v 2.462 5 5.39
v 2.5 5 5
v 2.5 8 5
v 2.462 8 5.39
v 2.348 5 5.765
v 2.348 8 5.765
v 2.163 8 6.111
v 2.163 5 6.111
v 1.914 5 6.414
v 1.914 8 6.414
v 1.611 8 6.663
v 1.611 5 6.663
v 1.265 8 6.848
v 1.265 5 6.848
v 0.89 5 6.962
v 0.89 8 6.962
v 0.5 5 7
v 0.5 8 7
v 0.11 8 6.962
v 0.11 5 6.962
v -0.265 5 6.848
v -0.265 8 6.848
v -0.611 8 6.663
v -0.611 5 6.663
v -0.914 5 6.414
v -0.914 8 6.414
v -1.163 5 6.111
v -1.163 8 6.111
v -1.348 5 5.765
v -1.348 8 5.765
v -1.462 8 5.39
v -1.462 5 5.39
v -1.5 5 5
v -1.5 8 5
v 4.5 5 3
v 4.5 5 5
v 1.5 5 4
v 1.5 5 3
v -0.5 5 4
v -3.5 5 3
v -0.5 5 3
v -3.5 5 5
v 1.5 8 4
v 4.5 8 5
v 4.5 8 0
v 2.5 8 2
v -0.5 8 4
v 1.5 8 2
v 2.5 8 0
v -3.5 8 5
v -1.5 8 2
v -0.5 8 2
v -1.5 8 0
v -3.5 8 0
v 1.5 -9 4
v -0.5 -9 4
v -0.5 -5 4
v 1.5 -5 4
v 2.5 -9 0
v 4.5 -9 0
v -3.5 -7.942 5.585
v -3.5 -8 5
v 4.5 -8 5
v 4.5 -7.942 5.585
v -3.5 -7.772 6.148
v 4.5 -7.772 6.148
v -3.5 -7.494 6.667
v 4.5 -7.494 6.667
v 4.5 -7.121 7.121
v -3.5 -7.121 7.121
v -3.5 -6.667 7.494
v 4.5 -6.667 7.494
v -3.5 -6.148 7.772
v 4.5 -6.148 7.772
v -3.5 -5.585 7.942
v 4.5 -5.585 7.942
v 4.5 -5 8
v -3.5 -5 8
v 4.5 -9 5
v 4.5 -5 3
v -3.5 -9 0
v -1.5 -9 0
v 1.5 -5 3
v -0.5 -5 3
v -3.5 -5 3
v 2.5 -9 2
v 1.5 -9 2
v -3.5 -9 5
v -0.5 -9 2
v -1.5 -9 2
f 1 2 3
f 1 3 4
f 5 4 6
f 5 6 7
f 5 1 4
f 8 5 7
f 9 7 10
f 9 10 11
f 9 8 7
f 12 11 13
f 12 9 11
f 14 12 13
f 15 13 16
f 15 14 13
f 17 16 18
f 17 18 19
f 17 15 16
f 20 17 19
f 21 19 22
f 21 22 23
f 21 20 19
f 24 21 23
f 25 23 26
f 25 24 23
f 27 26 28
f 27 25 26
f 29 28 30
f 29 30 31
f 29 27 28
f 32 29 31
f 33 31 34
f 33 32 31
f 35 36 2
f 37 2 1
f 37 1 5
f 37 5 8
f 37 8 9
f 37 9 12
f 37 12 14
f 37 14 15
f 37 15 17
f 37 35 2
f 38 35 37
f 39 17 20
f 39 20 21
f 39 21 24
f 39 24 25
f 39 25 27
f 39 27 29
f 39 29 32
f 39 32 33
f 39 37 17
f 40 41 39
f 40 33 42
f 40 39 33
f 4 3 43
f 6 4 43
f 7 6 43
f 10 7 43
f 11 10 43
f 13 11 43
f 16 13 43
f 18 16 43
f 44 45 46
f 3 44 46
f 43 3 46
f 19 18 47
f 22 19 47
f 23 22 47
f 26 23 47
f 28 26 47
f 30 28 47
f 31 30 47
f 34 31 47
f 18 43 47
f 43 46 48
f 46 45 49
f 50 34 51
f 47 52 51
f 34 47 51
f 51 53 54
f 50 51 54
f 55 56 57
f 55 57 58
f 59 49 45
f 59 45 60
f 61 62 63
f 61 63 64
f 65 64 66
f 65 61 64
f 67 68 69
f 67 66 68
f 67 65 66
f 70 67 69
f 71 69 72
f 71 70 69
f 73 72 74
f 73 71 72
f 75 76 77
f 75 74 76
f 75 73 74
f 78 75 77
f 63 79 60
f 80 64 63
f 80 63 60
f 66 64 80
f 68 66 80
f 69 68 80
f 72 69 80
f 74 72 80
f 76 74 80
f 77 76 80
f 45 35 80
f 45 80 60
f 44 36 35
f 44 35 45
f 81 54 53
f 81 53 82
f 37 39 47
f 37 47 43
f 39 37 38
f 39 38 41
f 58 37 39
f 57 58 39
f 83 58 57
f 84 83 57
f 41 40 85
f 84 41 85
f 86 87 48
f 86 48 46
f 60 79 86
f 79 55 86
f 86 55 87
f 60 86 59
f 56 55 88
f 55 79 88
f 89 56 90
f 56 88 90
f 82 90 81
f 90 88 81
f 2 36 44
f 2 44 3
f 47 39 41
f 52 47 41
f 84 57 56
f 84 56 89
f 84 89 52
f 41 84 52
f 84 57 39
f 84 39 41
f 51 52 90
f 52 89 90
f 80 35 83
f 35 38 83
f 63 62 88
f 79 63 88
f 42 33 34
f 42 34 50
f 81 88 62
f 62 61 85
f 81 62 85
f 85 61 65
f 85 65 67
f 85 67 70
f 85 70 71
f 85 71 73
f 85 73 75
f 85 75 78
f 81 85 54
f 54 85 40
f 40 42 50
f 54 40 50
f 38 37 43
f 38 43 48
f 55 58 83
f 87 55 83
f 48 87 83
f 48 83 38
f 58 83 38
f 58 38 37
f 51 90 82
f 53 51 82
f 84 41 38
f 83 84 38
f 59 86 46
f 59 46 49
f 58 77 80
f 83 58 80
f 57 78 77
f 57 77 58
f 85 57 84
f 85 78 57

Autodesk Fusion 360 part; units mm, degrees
sketch "Sketch1" plane through (0, 0, 0) normal (0, 0, 1) x (1, 0, 0)
  line L0 (3.5, -5) -> (-3.5, -5)
  line L1 (-3.5, -5) -> (-3.5, 5)
  line L2 (-3.5, 5) -> (3.5, 5)
  line L3 (3.5, 5) -> (3.5, -5)
  dimension "d1" = 7
  dimension "d2" = 10
extrude "Extrude1" add sketch "Sketch1" along normal blind 3 makes body 1
sketch "Sketch2" plane through (0, 0, 3) normal (0, 0, 1) x (-1, 0, 0)
  line L0 (-3.5, -5) -> (3.5, -5)
  line L1 (3.5, -5) -> (3.5, 5)
  line L2 (3.5, 5) -> (-3.5, 5)
  line L3 (-3.5, 5) -> (-3.5, -5)
  line L4 (3.5, 5) -> (-3.5, 5)
  line L5 (-3.5, 5) -> (-3.5, 9)
  line L6 (-3.5, 9) -> (3.5, 9)
  line L7 (3.5, 9) -> (3.5, 5)
  dimension "d5" = 7
  dimension "d6" = 4
extrude "Extrude2" add sketch "Sketch2" along normal blind 2 and the other way blind 3 contours L2 L4 L5 L6 L7 bodies 1
sketch "Sketch4" plane through (3.5, 0, 0) normal (1, 0, 0) x (0, 1, 0)
  line L0 (-9, 0) -> (5, 0)
  line L1 (5, 0) -> (5, 3)
  line L2 (5, 3) -> (-5, 3)
  line L3 (-5, 3) -> (-5, 5)
  line L4 (-5, 5) -> (-9, 5)
  line L5 (-9, 5) -> (-9, 0)
  line L6 (-5, 5) -> (-5, 8)
  arc A0 (-9, 0.8769) -> (-4.2583, 3) centre (-8, 5) ccw
  arc A1 (-5, 8) -> (-8, 5) centre (-5, 5) ccw
  arc A2 (-5, 2) -> (-2.7639, 3) centre (-5, 5) ccw
  dimension "d11" = 3
  dimension "d12" = 6
extrude "Extrude3" add sketch "Sketch4" against normal blind 7 contours L4 L6 A1 bodies 1
extrude "Extrude4" add 1 faces at (3.5, -3, 1) along direction (1, 0, 0) blind 1 on bodies 1 bodies 1
sketch "Sketch6" plane through (0, -9, 0) normal (0, -1, 0) x (1, 0, 0)
  line L0 (4.5, 5) -> (-3.5, 5)
  line L1 (-3.5, 5) -> (-3.5, 0)
  line L2 (-3.5, 0) -> (4.5, 0)
  line L3 (4.5, 0) -> (4.5, 5)
  line L4 (0.5, 5) -> (0.5, 4) construction
  line L5 (-3.5, 4) -> (-0.5, 4) construction
  line L6 (-0.5, 4) -> (1.5, 4)
  line L7 (1.5, 4) -> (1.5, 2)
  line L8 (-0.5, 4) -> (-0.5, 2)
  line L9 (-0.5, 2) -> (-1.5, 2)
  line L10 (-1.5, 2) -> (-1.5, 0)
  line L11 (1.5, 2) -> (2.5, 2)
  line L12 (2.5, 2) -> (2.5, 0)
extrude "Extrude5" cut sketch "Sketch6" against normal blind 4 contours L2 L6 L7 L8 L9 L10 L11 L12 bodies 1
sketch "Sketch7" plane through (0, 0, 3) normal (0, 0, 1) x (-1, 0, 0)
  line L0 (-4.5, -5) -> (3.5, -5)
  line L1 (3.5, -5) -> (3.5, 5)
  line L2 (3.5, 5) -> (0.5, 5)
  line L3 (0.5, 5) -> (-1.5, 5)
  line L4 (-1.5, 5) -> (-4.5, 5)
  line L5 (-4.5, 5) -> (-4.5, -5)
  line L6 (-4.5, -5) -> (-4.5, -8)
  line L7 (-4.5, -8) -> (3.5, -8)
  line L8 (3.5, -8) -> (3.5, -5)
  dimension "d22" = 8
extrude "Extrude6" add sketch "Sketch7" along normal blind 2 and the other way blind 3 contours L0 L6 L7 L8 bodies 1
sketch "Sketch8" plane through (0, 5, 0) normal (0, -1, 0) x (1, 0, 0)
  line L0 (-3.5, 3) -> (4.5, 3)
  line L1 (4.5, 3) -> (4.5, 5)
  line L2 (4.5, 5) -> (-3.5, 5)
  line L3 (-3.5, 5) -> (-3.5, 3)
  arc A0 (2.5, 5) -> (-1.5, 5) centre (0.5, 5) ccw
  dimension "d27" = 4
extrude "Extrude7" add sketch "Sketch8" against normal blind 3 contours L2 A0 bodies 1
sketch "Sketch9" plane through (0, -5, 0) normal (0, 1, 0) x (-1, 0, 0)
  line L0 (0.5, 4) -> (0.5, 3)
  line L1 (0.5, 3) -> (3.5, 3)
  line L2 (3.5, 3) -> (3.5, 8)
  line L3 (3.5, 8) -> (-4.5, 8)
  line L4 (-4.5, 8) -> (-4.5, 3)
  line L5 (-4.5, 3) -> (-1.5, 3)
  line L6 (-1.5, 3) -> (-1.5, 4)
  line L7 (-1.5, 4) -> (0.5, 4)
  line L8 (-1.5, 4) -> (-1.5, 3)
  line L9 (-1.5, 3) -> (0.5, 3)
  line L10 (0.5, 3) -> (0.5, 4)
  line L11 (0.5, 4) -> (-1.5, 4)
extrude "Extrude8" add sketch "Sketch9" along normal blind 10 contours L0 L6 L7 L8 L9 L10 L11 bodies 1
extrude "Extrude9" cut 1 faces at (0.8333, -5, 0.6667) along direction (0, 1, 0) blind 14 on bodies 1 bodies 1
sketch "Sketch10" plane through (0, -5, 0) normal (0, 1, 0) x (-1, 0, 0)
  line L0 (0.5, 4) -> (0.5, 3)
  line L1 (0.5, 3) -> (3.5, 3)
  line L2 (3.5, 3) -> (3.5, 8)
  line L3 (3.5, 8) -> (-4.5, 8)
  line L4 (-4.5, 8) -> (-4.5, 3)
  line L5 (-4.5, 3) -> (-1.5, 3)
  line L6 (-1.5, 3) -> (-1.5, 4)
  line L7 (-1.5, 4) -> (0.5, 4)
  line L8 (-1.5, 4) -> (0.5, 4)
  line L9 (0.5, 3) -> (-1.5, 3)
extrude "Extrude10" add sketch "Sketch10" along normal blind 10 separate body contours L0 L6 L7 L8 L9 makes body 2
